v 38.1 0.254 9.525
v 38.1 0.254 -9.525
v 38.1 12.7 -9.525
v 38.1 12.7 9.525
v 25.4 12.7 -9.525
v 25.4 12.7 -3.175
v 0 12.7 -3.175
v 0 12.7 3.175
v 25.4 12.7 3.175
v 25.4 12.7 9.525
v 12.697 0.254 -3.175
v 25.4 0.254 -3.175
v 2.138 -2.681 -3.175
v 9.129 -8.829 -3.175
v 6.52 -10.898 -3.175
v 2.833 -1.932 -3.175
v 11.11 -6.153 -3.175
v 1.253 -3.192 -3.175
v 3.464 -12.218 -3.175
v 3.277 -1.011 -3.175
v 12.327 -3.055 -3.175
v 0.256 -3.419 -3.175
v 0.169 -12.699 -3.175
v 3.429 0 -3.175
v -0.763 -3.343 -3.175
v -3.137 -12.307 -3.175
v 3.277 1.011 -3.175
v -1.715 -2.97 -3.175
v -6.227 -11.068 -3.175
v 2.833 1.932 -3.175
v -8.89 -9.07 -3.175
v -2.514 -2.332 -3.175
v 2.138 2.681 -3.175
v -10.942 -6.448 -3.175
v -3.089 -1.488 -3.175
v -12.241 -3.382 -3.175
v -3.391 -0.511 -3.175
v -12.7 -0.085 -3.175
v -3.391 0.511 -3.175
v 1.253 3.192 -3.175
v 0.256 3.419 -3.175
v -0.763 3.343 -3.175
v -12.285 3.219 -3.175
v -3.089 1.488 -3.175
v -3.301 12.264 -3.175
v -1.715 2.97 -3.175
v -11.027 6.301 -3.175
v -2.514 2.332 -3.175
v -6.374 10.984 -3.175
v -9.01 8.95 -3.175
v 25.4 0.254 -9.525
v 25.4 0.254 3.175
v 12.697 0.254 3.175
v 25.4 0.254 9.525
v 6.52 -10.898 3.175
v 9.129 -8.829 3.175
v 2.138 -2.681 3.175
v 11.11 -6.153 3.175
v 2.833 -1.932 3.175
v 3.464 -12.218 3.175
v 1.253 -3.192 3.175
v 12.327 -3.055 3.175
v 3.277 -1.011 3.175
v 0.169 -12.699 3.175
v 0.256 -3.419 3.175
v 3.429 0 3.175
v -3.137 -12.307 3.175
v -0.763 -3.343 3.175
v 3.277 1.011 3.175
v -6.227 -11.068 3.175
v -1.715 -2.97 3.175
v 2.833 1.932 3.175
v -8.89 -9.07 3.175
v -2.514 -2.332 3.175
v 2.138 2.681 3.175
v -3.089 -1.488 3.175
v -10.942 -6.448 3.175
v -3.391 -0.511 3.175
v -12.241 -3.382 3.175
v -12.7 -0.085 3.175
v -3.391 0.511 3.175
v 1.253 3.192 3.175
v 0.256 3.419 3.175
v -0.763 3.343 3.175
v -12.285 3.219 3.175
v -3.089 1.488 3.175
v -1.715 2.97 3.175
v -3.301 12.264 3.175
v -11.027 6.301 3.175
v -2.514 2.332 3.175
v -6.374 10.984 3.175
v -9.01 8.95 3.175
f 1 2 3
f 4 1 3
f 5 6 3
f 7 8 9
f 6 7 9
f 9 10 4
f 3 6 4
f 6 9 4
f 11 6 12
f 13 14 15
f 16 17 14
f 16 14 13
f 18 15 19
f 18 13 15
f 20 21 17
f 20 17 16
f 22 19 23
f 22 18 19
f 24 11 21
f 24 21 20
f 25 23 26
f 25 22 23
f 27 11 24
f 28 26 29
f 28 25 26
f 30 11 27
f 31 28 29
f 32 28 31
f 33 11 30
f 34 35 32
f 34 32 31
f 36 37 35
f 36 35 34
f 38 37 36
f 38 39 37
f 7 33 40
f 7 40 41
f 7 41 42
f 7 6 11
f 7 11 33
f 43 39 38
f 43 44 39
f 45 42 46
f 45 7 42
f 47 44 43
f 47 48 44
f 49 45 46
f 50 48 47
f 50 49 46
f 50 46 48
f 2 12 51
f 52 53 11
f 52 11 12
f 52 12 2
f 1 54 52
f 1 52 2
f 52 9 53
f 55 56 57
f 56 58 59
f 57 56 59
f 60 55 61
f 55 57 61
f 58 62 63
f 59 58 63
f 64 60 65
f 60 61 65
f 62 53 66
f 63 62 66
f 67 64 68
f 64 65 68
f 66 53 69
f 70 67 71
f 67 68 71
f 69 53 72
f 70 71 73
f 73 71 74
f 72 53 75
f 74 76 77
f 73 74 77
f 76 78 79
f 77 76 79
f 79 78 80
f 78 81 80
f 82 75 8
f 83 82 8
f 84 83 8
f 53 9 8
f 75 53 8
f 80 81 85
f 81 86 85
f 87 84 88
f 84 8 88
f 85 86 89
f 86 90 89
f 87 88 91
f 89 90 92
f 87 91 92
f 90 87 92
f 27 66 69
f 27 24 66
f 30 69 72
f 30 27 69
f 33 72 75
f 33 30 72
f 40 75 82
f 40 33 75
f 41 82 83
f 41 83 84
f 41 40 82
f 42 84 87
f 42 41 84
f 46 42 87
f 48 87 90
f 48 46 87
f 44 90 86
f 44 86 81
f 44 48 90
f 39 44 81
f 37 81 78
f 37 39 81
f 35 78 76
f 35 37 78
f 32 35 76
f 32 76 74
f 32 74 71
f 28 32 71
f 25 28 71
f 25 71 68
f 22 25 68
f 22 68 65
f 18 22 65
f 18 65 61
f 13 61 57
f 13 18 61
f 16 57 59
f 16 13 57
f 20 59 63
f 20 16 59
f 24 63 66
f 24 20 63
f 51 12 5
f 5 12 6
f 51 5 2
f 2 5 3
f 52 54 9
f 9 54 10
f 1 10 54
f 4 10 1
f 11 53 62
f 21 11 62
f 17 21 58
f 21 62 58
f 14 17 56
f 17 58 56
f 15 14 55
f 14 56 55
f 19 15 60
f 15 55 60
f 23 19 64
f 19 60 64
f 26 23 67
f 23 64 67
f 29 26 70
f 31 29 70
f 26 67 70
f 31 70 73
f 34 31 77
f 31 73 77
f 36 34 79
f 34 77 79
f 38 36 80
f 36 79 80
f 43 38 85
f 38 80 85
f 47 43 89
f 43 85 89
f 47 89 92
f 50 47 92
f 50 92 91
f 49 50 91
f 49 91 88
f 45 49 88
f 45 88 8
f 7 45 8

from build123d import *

# Parameters (mm, degrees)
SKETCH1_R           = 3.429
BOSS_EXTRUDE1_DEPTH = 3.175
SKETCH2_W           = 12.7
SKETCH2_H           = 12.446
BOSS_EXTRUDE2_DEPTH = 9.525


with BuildPart() as part:
    # Sketch1 → Boss-Extrude1 (new body, symmetric)
    with BuildSketch(Plane.XY):
        with BuildLine():
            Line((0, 12.7), (38.1, 12.7))
            Line((38.1, 12.7), (38.1, 0.254))
            Line((38.1, 0.254), (12.697459746, 0.254))
            ThreePointArc((12.697459746, 0.254), (-8.89, -9.069614104), (0, 12.7))
        make_face()
        Circle(SKETCH1_R, mode=Mode.SUBTRACT)
    extrude(amount=BOSS_EXTRUDE1_DEPTH, both=True)

    # Sketch2 → Boss-Extrude2 (add, symmetric)
    with BuildSketch(Plane.XY):
        with Locations((31.75, 6.477)):
            Rectangle(SKETCH2_W, SKETCH2_H)
    extrude(amount=BOSS_EXTRUDE2_DEPTH, both=True)


solid = part.part
